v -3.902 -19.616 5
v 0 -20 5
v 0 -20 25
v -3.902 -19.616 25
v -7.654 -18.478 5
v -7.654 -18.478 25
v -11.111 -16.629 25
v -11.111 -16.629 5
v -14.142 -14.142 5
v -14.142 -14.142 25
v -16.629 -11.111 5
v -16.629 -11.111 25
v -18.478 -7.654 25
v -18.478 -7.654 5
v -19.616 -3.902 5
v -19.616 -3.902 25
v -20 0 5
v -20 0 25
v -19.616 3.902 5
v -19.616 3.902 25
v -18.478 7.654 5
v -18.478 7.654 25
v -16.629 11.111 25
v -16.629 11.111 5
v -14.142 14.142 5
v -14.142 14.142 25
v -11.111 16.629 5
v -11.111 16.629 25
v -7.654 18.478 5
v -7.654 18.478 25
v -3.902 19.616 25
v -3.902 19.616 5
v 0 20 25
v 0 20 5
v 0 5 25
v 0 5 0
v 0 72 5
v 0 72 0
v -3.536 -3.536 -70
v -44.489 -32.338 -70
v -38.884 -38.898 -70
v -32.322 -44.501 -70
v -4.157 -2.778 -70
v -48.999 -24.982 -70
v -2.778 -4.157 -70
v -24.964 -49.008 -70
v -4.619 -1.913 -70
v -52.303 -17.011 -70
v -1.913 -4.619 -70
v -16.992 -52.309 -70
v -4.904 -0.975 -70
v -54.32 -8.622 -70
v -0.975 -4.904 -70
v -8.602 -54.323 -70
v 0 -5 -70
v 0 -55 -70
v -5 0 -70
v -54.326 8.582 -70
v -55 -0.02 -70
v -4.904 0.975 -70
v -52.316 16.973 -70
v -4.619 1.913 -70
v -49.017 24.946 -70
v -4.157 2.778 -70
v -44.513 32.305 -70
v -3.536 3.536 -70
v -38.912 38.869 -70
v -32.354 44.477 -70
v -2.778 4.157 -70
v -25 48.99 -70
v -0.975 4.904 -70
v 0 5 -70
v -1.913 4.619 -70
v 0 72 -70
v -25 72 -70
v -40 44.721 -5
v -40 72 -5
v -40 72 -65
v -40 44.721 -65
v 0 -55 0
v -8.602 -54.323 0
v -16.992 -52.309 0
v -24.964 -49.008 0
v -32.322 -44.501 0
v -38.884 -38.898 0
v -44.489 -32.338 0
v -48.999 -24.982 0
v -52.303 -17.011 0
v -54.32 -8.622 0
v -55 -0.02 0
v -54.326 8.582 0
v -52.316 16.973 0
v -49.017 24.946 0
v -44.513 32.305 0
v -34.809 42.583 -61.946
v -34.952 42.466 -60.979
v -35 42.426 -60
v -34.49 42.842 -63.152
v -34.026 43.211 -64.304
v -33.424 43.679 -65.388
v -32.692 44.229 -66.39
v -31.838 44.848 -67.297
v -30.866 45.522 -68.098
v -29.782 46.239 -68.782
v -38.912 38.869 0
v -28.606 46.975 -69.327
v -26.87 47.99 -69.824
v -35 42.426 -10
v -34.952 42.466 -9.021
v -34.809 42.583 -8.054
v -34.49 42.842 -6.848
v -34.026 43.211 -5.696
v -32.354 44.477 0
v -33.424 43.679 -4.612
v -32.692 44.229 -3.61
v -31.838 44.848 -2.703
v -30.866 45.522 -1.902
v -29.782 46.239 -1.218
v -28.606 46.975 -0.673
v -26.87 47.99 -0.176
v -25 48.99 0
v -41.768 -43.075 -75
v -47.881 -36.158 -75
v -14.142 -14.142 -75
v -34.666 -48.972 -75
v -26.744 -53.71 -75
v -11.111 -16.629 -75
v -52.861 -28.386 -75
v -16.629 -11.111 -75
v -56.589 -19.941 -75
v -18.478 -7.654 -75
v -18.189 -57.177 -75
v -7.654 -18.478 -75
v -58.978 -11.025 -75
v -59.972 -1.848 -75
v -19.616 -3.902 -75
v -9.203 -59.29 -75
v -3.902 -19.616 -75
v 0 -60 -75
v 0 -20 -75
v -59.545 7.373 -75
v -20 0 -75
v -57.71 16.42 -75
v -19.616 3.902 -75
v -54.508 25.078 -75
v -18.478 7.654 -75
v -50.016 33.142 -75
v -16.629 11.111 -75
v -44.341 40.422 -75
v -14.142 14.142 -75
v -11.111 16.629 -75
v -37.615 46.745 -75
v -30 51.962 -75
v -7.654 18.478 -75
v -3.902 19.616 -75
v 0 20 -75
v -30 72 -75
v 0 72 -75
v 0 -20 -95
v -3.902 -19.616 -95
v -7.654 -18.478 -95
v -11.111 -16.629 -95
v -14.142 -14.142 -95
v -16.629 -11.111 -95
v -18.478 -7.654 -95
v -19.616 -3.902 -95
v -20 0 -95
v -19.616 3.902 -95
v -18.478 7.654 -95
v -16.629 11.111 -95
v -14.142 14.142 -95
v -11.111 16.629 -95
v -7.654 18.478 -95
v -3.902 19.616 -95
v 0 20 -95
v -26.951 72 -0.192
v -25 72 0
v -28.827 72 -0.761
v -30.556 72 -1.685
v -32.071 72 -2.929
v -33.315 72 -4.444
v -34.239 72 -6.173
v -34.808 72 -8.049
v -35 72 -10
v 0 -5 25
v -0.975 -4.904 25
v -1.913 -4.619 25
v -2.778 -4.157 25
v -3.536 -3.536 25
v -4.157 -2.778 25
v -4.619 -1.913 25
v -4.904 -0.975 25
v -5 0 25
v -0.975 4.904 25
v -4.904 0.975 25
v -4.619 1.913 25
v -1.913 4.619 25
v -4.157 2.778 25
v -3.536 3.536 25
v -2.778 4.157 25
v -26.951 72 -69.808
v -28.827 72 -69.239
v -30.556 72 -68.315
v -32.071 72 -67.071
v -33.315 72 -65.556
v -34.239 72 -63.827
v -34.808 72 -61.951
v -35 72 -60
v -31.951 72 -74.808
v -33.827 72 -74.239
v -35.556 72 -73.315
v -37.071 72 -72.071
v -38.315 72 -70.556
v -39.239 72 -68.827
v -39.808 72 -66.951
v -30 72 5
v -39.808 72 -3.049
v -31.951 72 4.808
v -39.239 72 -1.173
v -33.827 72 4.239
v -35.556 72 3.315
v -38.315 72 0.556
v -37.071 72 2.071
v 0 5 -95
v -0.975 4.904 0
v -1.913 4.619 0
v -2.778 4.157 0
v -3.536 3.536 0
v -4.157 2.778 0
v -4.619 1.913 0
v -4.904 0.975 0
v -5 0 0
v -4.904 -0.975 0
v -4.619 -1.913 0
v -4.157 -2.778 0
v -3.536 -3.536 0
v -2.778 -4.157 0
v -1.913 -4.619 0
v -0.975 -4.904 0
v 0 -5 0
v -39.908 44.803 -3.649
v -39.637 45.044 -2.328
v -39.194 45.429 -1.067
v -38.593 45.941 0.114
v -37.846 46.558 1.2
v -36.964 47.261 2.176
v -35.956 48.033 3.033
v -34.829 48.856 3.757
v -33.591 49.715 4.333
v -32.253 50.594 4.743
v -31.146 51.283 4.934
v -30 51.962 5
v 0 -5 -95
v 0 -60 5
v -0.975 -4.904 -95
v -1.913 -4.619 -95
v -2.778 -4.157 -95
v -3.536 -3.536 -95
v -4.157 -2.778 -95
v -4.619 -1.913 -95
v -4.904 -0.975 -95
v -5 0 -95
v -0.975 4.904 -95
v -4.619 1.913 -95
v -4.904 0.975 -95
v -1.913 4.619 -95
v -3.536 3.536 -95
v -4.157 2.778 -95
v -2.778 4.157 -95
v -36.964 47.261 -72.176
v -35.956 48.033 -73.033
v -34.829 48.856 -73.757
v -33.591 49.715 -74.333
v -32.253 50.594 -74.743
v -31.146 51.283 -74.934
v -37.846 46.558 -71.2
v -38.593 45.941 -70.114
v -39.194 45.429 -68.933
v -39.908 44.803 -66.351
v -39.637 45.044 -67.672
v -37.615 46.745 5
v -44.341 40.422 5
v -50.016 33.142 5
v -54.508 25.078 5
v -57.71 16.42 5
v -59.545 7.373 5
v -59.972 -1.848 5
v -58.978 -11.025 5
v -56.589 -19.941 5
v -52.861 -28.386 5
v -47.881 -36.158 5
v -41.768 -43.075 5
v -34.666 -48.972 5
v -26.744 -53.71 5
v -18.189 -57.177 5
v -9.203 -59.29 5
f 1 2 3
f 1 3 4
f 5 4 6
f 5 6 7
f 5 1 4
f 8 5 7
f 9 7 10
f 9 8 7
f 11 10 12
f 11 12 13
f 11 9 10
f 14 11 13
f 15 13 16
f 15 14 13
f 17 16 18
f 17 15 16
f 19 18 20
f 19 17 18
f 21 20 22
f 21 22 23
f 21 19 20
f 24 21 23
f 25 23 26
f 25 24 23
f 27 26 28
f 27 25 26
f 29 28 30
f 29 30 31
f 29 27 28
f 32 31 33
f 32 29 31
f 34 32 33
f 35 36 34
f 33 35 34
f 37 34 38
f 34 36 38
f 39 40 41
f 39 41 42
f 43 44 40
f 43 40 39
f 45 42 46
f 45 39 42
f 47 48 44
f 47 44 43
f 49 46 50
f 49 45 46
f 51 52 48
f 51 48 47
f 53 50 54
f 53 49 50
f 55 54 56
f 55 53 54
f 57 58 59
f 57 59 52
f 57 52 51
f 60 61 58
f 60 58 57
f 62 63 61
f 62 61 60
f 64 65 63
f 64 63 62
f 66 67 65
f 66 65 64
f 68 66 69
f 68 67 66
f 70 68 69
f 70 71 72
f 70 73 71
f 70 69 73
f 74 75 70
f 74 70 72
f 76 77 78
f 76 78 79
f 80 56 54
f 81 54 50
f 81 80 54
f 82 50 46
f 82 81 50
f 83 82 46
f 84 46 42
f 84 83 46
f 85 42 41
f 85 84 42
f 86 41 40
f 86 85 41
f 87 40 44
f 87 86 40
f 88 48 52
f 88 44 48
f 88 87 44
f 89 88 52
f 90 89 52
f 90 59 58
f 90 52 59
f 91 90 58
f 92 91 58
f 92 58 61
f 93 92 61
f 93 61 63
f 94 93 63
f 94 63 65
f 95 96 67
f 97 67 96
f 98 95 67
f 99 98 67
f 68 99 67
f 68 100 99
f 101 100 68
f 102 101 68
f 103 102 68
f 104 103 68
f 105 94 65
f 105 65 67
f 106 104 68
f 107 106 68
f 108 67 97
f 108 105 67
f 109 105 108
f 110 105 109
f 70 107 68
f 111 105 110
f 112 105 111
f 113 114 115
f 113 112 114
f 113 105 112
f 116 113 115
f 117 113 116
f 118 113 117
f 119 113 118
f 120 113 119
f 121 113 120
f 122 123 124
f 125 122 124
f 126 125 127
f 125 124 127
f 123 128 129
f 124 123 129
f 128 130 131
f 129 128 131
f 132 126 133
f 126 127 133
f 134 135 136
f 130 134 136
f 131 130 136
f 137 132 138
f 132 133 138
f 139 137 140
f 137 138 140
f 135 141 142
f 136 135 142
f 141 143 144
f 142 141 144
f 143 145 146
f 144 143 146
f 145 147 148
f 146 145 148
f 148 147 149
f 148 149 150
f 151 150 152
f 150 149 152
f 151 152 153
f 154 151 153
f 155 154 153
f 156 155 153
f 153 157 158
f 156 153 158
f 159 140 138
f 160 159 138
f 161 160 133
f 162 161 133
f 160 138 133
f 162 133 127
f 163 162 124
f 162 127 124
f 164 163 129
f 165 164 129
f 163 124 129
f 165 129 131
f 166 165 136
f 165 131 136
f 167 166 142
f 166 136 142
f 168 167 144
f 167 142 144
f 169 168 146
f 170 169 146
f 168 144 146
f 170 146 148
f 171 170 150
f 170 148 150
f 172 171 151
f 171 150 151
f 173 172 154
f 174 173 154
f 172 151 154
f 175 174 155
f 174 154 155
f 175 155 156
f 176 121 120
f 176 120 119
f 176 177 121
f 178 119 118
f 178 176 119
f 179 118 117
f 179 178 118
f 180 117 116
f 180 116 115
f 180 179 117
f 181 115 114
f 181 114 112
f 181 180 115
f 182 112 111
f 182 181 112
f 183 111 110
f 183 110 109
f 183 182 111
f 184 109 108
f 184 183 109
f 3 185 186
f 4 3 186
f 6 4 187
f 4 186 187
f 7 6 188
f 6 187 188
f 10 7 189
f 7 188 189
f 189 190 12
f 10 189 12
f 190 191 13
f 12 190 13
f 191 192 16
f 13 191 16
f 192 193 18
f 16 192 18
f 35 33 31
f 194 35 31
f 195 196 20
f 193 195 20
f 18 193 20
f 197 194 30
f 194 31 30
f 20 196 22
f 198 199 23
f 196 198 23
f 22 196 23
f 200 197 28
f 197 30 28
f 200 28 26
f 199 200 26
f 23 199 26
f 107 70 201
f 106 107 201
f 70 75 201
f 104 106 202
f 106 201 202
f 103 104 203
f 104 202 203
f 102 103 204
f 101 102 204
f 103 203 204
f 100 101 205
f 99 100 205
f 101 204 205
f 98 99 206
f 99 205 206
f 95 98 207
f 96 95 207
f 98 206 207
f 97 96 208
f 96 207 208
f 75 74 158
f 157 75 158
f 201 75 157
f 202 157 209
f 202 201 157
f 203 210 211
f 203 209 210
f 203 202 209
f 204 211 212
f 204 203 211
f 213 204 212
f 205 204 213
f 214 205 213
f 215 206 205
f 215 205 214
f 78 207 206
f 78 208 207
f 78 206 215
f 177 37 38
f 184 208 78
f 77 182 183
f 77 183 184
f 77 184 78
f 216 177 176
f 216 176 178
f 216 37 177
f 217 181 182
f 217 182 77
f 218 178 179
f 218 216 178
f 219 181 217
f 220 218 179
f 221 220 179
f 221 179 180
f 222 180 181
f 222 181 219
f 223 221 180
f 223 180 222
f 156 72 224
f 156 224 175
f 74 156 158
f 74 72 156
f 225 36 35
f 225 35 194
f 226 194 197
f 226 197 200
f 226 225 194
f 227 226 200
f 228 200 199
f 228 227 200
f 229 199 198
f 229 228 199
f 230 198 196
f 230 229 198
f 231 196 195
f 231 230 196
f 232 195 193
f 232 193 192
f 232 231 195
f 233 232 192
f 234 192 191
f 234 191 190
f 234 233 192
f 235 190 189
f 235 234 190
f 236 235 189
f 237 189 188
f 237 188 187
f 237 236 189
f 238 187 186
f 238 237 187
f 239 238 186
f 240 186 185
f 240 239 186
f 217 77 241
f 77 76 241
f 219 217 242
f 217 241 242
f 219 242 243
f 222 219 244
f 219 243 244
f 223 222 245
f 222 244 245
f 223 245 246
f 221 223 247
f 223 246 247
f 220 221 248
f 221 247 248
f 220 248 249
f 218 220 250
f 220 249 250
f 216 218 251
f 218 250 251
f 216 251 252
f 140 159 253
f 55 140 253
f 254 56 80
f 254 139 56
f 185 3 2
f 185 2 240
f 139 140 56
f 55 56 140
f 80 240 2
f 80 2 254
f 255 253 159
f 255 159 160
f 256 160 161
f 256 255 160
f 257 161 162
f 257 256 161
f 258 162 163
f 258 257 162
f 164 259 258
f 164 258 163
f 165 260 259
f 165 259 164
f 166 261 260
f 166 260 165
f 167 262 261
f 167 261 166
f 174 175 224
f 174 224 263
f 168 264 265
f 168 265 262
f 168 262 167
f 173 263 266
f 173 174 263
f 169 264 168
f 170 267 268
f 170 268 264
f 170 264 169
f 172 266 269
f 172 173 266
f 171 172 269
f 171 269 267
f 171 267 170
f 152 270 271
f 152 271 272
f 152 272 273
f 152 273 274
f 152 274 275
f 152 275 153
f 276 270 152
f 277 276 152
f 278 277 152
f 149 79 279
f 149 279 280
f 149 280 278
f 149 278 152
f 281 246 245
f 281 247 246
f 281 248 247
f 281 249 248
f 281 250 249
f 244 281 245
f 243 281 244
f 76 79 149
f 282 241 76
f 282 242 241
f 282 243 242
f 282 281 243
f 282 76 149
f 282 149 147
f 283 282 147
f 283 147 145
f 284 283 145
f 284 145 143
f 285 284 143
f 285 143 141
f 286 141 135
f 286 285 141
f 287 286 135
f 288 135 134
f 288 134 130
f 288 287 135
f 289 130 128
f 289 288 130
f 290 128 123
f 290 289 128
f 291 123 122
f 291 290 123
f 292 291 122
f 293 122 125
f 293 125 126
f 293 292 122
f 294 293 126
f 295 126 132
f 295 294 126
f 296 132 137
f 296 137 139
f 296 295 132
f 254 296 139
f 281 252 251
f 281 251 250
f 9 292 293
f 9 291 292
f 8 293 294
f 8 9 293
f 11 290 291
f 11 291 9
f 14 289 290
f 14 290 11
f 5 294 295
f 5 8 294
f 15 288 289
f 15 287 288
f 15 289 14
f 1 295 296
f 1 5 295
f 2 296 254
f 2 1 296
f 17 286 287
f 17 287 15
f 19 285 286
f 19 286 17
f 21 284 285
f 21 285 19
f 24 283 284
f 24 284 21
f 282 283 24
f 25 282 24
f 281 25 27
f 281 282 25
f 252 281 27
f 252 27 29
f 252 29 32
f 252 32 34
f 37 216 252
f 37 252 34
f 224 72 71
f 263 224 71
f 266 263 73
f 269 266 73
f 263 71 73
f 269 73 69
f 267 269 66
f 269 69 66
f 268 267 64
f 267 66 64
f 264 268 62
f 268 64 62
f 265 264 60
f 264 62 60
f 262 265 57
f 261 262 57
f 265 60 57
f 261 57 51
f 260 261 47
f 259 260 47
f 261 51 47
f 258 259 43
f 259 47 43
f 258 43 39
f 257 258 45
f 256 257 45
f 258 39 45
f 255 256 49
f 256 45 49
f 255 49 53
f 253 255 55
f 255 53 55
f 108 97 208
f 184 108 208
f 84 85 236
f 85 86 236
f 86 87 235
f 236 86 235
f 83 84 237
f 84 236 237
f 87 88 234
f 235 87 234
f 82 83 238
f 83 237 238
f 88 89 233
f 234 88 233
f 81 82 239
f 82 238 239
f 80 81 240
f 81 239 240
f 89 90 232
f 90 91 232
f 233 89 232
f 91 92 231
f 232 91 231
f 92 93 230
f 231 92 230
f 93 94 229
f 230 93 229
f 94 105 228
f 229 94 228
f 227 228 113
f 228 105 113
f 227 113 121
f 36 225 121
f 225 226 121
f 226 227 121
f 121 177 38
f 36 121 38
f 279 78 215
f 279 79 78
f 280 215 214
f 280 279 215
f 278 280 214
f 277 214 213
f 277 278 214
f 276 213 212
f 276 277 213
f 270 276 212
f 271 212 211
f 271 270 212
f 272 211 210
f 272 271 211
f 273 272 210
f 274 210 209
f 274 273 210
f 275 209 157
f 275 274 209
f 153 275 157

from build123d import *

# Parameters (mm, degrees)
DODANIE_WYCI_GNI_CIE1_DEPTH       = 25
DODANIE_WYCI_GNI_CIE2_DEPTH       = 5
WYCI_GNI_CIE_CIENKA_CIANKA1_DEPTH = 70
ZAOKR_GLENIE2_R                   = 10


with BuildPart() as part:
    # Szkic1 → Dodanie-wyciągnięcie1 (new body)
    with BuildSketch(Plane.XY):
        with BuildLine():
            Line((0, -5), (0, -20))
            ThreePointArc((0, -20), (-20, 0), (0, 20))
            Line((0, 20), (0, 5))
            ThreePointArc((0, 5), (-5, 0), (0, -5))
        make_face()
    extrude(amount=DODANIE_WYCI_GNI_CIE1_DEPTH)

    # Szkic2 → Dodanie-wyciągnięcie2 (add)
    with BuildSketch(Plane.XY):
        with BuildLine():
            Line((0, 20), (0, 72))
            Line((0, 72), (-40, 72))
            Line((-40, 72), (-40, 44.72135955))
            ThreePointArc((-40, 44.72135955), (-56.050341538, -21.409325386), (0, -60))
            Line((0, -60), (0, -20))
            ThreePointArc((0, -20), (-20, 0), (0, 20))
        make_face()
    extrude(amount=DODANIE_WYCI_GNI_CIE2_DEPTH)


with BuildPart() as body_2:
    # Lustro3: mirrored copy
    add(part.part.mirror(Plane(origin=(0, 0, -35), x_dir=(1, 0, 0), z_dir=(0, 0, -1))))


with BuildPart() as part_1:
    add(part.part)

    add(body_2.part)  # Wyciągnięcie-cienka ścianka1 merges body 2
    # Szkic5 → Wyciągnięcie-cienka ścianka1 (add)
    with BuildSketch(Plane(origin=(0, 0, 0), x_dir=(-1, 0, 0), z_dir=(0, 0, -1))):
        with BuildLine():
            Line((40, 72), (40, 44.72135955))
            ThreePointArc((40, 44.72135955), (56.050341538, -21.409325386), (0, -60))
            Line((0, -60), (0, -55))
            ThreePointArc((0, -55), (51.76124215, -18.594994247), (35, 42.426406871))
            Line((35, 42.426406871), (35, 72))
            Line((35, 72), (40, 72))
        make_face()
    extrude(amount=WYCI_GNI_CIE_CIENKA_CIANKA1_DEPTH)

    # Zaokrąglenie2
    zaokr_glenie2_edges = [part_1.edges().sort_by_distance(p)[0] for p in [
        (-40, 58.360679775, 5),
        (-35, 57.213203436, -70),
        (-35, 57.213203436, 0),
        (-40, 58.360679775, -75),
    ]]
    fillet(zaokr_glenie2_edges, radius=ZAOKR_GLENIE2_R)


solid = part_1.part
